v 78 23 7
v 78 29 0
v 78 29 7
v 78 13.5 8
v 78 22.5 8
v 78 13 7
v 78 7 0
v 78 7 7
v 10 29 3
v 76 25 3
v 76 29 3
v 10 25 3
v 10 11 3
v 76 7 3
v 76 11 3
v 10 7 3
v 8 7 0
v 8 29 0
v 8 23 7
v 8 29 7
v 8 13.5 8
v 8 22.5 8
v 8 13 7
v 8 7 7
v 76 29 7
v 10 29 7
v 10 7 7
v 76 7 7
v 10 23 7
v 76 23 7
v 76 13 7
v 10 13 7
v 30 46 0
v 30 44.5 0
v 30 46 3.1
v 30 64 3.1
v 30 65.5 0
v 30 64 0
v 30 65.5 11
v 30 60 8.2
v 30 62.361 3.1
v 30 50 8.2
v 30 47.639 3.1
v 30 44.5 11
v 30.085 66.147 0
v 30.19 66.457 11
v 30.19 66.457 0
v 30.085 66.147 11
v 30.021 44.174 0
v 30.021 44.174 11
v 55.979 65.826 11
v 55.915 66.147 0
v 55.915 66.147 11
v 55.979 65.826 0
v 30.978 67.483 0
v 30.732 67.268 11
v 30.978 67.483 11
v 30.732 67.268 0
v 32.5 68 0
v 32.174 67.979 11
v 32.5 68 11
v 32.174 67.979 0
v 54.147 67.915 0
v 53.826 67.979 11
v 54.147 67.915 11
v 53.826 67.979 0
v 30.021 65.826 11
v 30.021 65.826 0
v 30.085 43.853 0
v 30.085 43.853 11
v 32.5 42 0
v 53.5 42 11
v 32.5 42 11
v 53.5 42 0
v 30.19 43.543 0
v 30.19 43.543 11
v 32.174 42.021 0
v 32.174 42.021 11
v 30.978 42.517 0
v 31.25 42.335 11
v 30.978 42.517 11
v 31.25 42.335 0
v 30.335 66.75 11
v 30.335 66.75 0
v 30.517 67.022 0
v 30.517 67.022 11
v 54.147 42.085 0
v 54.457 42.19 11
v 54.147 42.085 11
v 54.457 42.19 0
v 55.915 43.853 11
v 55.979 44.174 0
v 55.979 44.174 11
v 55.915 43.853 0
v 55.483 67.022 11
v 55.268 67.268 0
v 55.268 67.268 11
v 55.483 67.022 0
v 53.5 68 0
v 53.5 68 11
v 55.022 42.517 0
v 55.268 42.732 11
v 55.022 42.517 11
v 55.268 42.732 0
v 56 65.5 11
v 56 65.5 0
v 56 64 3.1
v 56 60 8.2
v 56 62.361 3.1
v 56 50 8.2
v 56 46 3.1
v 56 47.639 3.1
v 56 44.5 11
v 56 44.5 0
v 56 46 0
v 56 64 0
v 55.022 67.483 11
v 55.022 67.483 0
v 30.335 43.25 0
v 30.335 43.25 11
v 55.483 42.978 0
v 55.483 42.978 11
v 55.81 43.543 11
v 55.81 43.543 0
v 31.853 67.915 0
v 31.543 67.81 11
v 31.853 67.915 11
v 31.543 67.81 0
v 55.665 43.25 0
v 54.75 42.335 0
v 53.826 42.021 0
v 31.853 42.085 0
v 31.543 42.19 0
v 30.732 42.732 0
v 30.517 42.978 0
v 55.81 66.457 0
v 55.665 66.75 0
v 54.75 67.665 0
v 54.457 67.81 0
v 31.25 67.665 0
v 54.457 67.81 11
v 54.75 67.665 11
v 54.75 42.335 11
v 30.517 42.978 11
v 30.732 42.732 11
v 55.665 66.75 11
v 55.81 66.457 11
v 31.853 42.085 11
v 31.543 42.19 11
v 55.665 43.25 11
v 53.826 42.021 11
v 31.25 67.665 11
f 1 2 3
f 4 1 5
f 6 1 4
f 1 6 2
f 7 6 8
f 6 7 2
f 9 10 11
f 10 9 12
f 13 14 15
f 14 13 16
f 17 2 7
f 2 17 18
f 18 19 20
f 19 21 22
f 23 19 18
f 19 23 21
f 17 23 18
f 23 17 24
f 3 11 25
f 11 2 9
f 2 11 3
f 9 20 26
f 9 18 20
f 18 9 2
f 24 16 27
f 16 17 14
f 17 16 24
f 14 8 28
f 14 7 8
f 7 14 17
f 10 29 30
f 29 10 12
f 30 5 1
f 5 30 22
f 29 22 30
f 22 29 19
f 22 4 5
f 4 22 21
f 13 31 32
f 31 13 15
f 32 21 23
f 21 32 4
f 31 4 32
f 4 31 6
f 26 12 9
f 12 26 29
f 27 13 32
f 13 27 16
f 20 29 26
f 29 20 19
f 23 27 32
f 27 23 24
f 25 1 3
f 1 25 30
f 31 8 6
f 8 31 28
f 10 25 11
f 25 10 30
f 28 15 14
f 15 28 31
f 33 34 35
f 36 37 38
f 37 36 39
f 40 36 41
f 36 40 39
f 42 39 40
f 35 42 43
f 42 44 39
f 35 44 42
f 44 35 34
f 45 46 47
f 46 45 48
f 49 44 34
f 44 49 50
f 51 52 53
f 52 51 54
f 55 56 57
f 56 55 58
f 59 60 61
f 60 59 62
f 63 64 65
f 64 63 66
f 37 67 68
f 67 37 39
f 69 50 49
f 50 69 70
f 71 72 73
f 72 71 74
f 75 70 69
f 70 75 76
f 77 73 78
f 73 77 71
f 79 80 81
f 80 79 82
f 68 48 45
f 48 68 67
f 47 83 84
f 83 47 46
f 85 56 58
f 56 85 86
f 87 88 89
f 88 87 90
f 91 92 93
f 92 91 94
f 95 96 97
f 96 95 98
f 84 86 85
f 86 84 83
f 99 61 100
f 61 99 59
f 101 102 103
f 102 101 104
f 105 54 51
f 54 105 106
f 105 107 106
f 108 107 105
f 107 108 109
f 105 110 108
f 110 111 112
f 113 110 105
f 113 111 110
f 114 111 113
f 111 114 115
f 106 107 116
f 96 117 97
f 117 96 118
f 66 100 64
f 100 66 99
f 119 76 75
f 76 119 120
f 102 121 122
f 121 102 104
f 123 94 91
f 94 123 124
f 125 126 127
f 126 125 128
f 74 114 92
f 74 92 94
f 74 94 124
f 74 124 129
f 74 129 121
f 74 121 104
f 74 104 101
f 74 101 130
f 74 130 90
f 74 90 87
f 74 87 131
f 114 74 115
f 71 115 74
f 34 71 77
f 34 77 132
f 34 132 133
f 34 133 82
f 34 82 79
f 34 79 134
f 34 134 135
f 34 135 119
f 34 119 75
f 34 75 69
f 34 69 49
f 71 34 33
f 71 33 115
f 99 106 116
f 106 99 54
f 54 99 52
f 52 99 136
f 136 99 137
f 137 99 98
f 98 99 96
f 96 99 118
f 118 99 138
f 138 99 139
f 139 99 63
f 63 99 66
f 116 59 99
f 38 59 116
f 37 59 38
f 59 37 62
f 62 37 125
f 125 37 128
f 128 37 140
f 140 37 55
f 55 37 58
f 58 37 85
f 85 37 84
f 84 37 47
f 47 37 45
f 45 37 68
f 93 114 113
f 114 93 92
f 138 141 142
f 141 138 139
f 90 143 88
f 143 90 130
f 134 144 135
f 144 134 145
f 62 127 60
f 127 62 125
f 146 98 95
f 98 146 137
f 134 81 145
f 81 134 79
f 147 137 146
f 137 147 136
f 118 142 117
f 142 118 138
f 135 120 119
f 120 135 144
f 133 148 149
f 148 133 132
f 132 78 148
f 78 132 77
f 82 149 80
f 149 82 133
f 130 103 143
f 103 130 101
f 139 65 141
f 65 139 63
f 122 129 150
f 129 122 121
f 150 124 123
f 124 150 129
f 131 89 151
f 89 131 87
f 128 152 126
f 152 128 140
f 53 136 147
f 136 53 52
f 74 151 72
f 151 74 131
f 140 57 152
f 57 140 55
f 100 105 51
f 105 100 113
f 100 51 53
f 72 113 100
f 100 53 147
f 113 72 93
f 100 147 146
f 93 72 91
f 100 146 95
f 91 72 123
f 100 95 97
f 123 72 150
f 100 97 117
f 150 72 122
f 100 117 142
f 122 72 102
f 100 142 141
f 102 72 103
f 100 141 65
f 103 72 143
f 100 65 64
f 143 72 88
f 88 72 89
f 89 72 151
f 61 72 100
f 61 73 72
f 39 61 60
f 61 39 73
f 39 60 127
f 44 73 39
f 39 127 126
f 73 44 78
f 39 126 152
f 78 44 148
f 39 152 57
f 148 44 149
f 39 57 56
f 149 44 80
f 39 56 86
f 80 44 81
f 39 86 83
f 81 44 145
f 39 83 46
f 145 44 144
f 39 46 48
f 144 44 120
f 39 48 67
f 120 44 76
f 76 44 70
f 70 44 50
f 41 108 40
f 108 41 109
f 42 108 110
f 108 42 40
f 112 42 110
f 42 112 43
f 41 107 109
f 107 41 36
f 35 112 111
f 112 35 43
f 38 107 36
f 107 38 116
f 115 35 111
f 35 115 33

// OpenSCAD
/*
Sample 088: Schwalbenschwanz-Linearführung — 0,50 mm
Generated from the FDM Mechanical Sample Library.
Units: millimetres.

Override examples:
  openscad -o custom.stl -D 'view="plate"' -D 'render_fn=64' model.scad
  openscad -o preview.png -D 'view="assembly"' model.scad
*/
use <../../../library/fdm_mechanisms.scad>

render_fn = is_undef(render_fn) ? 48 : render_fn;
view = is_undef(view) ? "plate" : view;
$fn = render_fn;

sample_dovetail_rail(
    view=view,
    clearance=0.5,
    length=70,
    carriage_l=26
);
